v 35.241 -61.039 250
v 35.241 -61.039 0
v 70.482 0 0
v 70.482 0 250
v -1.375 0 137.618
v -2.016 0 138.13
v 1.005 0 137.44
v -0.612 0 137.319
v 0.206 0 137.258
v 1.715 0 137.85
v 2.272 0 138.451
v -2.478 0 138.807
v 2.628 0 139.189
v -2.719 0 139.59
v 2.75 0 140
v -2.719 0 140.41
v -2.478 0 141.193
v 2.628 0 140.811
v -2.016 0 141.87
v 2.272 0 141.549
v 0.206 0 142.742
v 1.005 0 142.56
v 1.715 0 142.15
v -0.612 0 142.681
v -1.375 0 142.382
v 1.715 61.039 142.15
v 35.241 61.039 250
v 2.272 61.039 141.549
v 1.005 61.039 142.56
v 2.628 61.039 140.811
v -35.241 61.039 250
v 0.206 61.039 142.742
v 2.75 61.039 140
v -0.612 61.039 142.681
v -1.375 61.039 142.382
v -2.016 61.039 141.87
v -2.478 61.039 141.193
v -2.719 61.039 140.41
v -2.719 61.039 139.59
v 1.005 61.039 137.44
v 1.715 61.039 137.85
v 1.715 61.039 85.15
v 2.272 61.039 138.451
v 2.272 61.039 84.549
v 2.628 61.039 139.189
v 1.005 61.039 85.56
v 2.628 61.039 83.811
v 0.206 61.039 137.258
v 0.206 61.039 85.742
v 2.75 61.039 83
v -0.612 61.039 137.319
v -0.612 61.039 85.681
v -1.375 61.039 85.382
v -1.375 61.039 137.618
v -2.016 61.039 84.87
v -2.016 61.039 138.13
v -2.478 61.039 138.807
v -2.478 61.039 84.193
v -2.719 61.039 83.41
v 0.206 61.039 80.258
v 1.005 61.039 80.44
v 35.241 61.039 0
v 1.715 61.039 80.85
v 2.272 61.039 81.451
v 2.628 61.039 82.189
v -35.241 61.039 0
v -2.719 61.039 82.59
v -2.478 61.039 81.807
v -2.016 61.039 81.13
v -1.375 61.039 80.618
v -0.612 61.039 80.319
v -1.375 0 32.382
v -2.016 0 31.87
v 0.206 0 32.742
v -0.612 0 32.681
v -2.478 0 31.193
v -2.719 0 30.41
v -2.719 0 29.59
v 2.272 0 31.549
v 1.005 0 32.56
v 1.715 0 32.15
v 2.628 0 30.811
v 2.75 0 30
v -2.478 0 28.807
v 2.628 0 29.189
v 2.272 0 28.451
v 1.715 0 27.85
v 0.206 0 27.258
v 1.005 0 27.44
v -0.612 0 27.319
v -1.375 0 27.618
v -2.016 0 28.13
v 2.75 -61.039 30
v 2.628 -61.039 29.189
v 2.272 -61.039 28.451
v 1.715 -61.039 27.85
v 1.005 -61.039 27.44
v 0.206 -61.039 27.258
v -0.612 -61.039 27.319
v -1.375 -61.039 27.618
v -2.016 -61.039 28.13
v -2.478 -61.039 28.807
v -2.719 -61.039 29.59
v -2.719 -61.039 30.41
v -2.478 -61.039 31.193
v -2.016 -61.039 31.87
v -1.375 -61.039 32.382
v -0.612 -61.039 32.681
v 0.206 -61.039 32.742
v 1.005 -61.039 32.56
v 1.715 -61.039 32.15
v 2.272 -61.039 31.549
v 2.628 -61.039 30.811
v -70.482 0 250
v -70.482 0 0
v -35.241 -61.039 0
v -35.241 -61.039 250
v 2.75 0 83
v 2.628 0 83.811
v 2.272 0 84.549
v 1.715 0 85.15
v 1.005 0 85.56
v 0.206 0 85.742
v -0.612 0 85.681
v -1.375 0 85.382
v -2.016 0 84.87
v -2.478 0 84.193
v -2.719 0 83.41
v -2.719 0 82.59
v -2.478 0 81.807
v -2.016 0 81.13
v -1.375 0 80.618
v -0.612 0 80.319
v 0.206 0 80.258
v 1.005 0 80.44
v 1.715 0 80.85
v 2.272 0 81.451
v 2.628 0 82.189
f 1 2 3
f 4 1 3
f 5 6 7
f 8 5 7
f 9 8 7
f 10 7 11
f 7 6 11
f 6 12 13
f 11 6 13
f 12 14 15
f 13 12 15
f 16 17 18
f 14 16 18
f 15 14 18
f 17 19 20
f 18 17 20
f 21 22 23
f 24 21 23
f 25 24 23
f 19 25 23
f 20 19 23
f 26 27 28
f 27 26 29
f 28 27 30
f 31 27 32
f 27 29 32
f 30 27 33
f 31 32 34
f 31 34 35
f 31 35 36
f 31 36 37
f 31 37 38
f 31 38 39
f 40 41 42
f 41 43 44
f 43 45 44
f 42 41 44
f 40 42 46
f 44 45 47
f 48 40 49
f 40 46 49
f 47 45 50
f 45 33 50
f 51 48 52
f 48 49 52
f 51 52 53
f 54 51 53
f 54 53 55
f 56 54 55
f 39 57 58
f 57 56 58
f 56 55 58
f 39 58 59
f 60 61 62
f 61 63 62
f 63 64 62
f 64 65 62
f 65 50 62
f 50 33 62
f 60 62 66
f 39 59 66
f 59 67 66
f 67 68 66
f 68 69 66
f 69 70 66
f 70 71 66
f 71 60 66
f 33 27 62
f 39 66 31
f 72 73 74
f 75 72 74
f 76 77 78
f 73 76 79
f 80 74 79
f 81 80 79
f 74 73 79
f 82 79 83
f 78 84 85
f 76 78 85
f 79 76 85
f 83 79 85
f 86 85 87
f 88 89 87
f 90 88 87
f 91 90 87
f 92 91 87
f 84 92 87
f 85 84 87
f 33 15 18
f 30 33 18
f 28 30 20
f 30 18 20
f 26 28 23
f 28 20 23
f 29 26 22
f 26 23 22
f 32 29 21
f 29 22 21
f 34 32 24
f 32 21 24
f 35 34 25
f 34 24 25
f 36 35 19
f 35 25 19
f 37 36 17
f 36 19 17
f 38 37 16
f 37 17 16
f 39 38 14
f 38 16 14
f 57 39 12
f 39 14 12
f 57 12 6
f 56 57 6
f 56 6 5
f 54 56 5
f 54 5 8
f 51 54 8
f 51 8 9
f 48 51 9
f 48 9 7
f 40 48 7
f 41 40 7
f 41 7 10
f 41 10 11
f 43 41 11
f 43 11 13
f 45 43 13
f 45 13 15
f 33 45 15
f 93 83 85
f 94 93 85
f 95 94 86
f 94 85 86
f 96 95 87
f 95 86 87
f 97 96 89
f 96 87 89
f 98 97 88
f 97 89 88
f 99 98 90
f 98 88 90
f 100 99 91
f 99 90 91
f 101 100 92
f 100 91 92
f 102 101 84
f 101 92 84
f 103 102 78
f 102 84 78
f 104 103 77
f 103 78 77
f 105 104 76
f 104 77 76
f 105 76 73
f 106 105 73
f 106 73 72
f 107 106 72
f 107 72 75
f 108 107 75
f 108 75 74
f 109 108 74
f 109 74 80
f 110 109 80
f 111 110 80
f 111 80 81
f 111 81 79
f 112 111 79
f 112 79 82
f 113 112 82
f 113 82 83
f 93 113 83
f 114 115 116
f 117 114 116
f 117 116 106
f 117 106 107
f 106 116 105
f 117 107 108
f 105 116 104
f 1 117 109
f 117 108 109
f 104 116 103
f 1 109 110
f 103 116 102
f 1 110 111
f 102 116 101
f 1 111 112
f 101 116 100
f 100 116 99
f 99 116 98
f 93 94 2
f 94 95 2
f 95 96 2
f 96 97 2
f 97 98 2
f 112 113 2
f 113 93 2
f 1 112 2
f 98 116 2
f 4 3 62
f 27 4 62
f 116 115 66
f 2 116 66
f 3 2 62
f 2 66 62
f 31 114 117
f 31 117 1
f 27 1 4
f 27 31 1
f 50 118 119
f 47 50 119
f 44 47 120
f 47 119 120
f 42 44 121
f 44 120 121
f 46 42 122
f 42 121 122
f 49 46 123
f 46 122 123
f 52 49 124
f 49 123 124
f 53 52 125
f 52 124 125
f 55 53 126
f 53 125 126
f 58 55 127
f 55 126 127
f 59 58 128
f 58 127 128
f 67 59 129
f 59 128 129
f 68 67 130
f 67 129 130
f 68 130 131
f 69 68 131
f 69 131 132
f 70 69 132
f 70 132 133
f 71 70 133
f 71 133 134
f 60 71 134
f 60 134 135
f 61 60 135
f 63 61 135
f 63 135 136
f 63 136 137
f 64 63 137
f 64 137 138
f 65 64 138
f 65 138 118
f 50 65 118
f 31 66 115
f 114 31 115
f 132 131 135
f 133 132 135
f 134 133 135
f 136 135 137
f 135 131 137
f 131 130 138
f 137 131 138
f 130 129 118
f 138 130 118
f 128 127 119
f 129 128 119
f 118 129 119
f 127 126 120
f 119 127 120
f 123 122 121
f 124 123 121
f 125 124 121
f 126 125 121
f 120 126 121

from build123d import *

# Parameters (mm, degrees)
F1_DEPTH = 250
F3_D     = 5.5
F3_DEPTH = 61.0402304845
F4_D     = 5.5
F4_DEPTH = 61.0402304845


with BuildPart() as f1:
    # F0 (on Top) → F1 (new body)
    with BuildSketch(Plane.XY):
        Polygon((35.2410161514, -61.0392304845), (70.4820323028, 0), (35.2410161514, 61.0392304845), (-35.2410161514, 61.0392304845), (-70.4820323028, 0), (-35.2410161514, -61.0392304845), align=None)
    extrude(amount=F1_DEPTH)

    # F3 (through all, one way)
    with BuildSketch(Plane.XZ):
        with Locations((0, 140), (0, 83)):
            Circle(F3_D / 2)
    extrude(amount=-F3_DEPTH, mode=Mode.SUBTRACT)

    # F4 (through all, one way)
    with BuildSketch(Plane(origin=(0, 0, 0), x_dir=(1, 0, 0), z_dir=(0, 1, 0))):
        with Locations((0, -30)):
            Circle(F4_D / 2)
    extrude(amount=-F4_DEPTH, mode=Mode.SUBTRACT)


solid = f1.part
